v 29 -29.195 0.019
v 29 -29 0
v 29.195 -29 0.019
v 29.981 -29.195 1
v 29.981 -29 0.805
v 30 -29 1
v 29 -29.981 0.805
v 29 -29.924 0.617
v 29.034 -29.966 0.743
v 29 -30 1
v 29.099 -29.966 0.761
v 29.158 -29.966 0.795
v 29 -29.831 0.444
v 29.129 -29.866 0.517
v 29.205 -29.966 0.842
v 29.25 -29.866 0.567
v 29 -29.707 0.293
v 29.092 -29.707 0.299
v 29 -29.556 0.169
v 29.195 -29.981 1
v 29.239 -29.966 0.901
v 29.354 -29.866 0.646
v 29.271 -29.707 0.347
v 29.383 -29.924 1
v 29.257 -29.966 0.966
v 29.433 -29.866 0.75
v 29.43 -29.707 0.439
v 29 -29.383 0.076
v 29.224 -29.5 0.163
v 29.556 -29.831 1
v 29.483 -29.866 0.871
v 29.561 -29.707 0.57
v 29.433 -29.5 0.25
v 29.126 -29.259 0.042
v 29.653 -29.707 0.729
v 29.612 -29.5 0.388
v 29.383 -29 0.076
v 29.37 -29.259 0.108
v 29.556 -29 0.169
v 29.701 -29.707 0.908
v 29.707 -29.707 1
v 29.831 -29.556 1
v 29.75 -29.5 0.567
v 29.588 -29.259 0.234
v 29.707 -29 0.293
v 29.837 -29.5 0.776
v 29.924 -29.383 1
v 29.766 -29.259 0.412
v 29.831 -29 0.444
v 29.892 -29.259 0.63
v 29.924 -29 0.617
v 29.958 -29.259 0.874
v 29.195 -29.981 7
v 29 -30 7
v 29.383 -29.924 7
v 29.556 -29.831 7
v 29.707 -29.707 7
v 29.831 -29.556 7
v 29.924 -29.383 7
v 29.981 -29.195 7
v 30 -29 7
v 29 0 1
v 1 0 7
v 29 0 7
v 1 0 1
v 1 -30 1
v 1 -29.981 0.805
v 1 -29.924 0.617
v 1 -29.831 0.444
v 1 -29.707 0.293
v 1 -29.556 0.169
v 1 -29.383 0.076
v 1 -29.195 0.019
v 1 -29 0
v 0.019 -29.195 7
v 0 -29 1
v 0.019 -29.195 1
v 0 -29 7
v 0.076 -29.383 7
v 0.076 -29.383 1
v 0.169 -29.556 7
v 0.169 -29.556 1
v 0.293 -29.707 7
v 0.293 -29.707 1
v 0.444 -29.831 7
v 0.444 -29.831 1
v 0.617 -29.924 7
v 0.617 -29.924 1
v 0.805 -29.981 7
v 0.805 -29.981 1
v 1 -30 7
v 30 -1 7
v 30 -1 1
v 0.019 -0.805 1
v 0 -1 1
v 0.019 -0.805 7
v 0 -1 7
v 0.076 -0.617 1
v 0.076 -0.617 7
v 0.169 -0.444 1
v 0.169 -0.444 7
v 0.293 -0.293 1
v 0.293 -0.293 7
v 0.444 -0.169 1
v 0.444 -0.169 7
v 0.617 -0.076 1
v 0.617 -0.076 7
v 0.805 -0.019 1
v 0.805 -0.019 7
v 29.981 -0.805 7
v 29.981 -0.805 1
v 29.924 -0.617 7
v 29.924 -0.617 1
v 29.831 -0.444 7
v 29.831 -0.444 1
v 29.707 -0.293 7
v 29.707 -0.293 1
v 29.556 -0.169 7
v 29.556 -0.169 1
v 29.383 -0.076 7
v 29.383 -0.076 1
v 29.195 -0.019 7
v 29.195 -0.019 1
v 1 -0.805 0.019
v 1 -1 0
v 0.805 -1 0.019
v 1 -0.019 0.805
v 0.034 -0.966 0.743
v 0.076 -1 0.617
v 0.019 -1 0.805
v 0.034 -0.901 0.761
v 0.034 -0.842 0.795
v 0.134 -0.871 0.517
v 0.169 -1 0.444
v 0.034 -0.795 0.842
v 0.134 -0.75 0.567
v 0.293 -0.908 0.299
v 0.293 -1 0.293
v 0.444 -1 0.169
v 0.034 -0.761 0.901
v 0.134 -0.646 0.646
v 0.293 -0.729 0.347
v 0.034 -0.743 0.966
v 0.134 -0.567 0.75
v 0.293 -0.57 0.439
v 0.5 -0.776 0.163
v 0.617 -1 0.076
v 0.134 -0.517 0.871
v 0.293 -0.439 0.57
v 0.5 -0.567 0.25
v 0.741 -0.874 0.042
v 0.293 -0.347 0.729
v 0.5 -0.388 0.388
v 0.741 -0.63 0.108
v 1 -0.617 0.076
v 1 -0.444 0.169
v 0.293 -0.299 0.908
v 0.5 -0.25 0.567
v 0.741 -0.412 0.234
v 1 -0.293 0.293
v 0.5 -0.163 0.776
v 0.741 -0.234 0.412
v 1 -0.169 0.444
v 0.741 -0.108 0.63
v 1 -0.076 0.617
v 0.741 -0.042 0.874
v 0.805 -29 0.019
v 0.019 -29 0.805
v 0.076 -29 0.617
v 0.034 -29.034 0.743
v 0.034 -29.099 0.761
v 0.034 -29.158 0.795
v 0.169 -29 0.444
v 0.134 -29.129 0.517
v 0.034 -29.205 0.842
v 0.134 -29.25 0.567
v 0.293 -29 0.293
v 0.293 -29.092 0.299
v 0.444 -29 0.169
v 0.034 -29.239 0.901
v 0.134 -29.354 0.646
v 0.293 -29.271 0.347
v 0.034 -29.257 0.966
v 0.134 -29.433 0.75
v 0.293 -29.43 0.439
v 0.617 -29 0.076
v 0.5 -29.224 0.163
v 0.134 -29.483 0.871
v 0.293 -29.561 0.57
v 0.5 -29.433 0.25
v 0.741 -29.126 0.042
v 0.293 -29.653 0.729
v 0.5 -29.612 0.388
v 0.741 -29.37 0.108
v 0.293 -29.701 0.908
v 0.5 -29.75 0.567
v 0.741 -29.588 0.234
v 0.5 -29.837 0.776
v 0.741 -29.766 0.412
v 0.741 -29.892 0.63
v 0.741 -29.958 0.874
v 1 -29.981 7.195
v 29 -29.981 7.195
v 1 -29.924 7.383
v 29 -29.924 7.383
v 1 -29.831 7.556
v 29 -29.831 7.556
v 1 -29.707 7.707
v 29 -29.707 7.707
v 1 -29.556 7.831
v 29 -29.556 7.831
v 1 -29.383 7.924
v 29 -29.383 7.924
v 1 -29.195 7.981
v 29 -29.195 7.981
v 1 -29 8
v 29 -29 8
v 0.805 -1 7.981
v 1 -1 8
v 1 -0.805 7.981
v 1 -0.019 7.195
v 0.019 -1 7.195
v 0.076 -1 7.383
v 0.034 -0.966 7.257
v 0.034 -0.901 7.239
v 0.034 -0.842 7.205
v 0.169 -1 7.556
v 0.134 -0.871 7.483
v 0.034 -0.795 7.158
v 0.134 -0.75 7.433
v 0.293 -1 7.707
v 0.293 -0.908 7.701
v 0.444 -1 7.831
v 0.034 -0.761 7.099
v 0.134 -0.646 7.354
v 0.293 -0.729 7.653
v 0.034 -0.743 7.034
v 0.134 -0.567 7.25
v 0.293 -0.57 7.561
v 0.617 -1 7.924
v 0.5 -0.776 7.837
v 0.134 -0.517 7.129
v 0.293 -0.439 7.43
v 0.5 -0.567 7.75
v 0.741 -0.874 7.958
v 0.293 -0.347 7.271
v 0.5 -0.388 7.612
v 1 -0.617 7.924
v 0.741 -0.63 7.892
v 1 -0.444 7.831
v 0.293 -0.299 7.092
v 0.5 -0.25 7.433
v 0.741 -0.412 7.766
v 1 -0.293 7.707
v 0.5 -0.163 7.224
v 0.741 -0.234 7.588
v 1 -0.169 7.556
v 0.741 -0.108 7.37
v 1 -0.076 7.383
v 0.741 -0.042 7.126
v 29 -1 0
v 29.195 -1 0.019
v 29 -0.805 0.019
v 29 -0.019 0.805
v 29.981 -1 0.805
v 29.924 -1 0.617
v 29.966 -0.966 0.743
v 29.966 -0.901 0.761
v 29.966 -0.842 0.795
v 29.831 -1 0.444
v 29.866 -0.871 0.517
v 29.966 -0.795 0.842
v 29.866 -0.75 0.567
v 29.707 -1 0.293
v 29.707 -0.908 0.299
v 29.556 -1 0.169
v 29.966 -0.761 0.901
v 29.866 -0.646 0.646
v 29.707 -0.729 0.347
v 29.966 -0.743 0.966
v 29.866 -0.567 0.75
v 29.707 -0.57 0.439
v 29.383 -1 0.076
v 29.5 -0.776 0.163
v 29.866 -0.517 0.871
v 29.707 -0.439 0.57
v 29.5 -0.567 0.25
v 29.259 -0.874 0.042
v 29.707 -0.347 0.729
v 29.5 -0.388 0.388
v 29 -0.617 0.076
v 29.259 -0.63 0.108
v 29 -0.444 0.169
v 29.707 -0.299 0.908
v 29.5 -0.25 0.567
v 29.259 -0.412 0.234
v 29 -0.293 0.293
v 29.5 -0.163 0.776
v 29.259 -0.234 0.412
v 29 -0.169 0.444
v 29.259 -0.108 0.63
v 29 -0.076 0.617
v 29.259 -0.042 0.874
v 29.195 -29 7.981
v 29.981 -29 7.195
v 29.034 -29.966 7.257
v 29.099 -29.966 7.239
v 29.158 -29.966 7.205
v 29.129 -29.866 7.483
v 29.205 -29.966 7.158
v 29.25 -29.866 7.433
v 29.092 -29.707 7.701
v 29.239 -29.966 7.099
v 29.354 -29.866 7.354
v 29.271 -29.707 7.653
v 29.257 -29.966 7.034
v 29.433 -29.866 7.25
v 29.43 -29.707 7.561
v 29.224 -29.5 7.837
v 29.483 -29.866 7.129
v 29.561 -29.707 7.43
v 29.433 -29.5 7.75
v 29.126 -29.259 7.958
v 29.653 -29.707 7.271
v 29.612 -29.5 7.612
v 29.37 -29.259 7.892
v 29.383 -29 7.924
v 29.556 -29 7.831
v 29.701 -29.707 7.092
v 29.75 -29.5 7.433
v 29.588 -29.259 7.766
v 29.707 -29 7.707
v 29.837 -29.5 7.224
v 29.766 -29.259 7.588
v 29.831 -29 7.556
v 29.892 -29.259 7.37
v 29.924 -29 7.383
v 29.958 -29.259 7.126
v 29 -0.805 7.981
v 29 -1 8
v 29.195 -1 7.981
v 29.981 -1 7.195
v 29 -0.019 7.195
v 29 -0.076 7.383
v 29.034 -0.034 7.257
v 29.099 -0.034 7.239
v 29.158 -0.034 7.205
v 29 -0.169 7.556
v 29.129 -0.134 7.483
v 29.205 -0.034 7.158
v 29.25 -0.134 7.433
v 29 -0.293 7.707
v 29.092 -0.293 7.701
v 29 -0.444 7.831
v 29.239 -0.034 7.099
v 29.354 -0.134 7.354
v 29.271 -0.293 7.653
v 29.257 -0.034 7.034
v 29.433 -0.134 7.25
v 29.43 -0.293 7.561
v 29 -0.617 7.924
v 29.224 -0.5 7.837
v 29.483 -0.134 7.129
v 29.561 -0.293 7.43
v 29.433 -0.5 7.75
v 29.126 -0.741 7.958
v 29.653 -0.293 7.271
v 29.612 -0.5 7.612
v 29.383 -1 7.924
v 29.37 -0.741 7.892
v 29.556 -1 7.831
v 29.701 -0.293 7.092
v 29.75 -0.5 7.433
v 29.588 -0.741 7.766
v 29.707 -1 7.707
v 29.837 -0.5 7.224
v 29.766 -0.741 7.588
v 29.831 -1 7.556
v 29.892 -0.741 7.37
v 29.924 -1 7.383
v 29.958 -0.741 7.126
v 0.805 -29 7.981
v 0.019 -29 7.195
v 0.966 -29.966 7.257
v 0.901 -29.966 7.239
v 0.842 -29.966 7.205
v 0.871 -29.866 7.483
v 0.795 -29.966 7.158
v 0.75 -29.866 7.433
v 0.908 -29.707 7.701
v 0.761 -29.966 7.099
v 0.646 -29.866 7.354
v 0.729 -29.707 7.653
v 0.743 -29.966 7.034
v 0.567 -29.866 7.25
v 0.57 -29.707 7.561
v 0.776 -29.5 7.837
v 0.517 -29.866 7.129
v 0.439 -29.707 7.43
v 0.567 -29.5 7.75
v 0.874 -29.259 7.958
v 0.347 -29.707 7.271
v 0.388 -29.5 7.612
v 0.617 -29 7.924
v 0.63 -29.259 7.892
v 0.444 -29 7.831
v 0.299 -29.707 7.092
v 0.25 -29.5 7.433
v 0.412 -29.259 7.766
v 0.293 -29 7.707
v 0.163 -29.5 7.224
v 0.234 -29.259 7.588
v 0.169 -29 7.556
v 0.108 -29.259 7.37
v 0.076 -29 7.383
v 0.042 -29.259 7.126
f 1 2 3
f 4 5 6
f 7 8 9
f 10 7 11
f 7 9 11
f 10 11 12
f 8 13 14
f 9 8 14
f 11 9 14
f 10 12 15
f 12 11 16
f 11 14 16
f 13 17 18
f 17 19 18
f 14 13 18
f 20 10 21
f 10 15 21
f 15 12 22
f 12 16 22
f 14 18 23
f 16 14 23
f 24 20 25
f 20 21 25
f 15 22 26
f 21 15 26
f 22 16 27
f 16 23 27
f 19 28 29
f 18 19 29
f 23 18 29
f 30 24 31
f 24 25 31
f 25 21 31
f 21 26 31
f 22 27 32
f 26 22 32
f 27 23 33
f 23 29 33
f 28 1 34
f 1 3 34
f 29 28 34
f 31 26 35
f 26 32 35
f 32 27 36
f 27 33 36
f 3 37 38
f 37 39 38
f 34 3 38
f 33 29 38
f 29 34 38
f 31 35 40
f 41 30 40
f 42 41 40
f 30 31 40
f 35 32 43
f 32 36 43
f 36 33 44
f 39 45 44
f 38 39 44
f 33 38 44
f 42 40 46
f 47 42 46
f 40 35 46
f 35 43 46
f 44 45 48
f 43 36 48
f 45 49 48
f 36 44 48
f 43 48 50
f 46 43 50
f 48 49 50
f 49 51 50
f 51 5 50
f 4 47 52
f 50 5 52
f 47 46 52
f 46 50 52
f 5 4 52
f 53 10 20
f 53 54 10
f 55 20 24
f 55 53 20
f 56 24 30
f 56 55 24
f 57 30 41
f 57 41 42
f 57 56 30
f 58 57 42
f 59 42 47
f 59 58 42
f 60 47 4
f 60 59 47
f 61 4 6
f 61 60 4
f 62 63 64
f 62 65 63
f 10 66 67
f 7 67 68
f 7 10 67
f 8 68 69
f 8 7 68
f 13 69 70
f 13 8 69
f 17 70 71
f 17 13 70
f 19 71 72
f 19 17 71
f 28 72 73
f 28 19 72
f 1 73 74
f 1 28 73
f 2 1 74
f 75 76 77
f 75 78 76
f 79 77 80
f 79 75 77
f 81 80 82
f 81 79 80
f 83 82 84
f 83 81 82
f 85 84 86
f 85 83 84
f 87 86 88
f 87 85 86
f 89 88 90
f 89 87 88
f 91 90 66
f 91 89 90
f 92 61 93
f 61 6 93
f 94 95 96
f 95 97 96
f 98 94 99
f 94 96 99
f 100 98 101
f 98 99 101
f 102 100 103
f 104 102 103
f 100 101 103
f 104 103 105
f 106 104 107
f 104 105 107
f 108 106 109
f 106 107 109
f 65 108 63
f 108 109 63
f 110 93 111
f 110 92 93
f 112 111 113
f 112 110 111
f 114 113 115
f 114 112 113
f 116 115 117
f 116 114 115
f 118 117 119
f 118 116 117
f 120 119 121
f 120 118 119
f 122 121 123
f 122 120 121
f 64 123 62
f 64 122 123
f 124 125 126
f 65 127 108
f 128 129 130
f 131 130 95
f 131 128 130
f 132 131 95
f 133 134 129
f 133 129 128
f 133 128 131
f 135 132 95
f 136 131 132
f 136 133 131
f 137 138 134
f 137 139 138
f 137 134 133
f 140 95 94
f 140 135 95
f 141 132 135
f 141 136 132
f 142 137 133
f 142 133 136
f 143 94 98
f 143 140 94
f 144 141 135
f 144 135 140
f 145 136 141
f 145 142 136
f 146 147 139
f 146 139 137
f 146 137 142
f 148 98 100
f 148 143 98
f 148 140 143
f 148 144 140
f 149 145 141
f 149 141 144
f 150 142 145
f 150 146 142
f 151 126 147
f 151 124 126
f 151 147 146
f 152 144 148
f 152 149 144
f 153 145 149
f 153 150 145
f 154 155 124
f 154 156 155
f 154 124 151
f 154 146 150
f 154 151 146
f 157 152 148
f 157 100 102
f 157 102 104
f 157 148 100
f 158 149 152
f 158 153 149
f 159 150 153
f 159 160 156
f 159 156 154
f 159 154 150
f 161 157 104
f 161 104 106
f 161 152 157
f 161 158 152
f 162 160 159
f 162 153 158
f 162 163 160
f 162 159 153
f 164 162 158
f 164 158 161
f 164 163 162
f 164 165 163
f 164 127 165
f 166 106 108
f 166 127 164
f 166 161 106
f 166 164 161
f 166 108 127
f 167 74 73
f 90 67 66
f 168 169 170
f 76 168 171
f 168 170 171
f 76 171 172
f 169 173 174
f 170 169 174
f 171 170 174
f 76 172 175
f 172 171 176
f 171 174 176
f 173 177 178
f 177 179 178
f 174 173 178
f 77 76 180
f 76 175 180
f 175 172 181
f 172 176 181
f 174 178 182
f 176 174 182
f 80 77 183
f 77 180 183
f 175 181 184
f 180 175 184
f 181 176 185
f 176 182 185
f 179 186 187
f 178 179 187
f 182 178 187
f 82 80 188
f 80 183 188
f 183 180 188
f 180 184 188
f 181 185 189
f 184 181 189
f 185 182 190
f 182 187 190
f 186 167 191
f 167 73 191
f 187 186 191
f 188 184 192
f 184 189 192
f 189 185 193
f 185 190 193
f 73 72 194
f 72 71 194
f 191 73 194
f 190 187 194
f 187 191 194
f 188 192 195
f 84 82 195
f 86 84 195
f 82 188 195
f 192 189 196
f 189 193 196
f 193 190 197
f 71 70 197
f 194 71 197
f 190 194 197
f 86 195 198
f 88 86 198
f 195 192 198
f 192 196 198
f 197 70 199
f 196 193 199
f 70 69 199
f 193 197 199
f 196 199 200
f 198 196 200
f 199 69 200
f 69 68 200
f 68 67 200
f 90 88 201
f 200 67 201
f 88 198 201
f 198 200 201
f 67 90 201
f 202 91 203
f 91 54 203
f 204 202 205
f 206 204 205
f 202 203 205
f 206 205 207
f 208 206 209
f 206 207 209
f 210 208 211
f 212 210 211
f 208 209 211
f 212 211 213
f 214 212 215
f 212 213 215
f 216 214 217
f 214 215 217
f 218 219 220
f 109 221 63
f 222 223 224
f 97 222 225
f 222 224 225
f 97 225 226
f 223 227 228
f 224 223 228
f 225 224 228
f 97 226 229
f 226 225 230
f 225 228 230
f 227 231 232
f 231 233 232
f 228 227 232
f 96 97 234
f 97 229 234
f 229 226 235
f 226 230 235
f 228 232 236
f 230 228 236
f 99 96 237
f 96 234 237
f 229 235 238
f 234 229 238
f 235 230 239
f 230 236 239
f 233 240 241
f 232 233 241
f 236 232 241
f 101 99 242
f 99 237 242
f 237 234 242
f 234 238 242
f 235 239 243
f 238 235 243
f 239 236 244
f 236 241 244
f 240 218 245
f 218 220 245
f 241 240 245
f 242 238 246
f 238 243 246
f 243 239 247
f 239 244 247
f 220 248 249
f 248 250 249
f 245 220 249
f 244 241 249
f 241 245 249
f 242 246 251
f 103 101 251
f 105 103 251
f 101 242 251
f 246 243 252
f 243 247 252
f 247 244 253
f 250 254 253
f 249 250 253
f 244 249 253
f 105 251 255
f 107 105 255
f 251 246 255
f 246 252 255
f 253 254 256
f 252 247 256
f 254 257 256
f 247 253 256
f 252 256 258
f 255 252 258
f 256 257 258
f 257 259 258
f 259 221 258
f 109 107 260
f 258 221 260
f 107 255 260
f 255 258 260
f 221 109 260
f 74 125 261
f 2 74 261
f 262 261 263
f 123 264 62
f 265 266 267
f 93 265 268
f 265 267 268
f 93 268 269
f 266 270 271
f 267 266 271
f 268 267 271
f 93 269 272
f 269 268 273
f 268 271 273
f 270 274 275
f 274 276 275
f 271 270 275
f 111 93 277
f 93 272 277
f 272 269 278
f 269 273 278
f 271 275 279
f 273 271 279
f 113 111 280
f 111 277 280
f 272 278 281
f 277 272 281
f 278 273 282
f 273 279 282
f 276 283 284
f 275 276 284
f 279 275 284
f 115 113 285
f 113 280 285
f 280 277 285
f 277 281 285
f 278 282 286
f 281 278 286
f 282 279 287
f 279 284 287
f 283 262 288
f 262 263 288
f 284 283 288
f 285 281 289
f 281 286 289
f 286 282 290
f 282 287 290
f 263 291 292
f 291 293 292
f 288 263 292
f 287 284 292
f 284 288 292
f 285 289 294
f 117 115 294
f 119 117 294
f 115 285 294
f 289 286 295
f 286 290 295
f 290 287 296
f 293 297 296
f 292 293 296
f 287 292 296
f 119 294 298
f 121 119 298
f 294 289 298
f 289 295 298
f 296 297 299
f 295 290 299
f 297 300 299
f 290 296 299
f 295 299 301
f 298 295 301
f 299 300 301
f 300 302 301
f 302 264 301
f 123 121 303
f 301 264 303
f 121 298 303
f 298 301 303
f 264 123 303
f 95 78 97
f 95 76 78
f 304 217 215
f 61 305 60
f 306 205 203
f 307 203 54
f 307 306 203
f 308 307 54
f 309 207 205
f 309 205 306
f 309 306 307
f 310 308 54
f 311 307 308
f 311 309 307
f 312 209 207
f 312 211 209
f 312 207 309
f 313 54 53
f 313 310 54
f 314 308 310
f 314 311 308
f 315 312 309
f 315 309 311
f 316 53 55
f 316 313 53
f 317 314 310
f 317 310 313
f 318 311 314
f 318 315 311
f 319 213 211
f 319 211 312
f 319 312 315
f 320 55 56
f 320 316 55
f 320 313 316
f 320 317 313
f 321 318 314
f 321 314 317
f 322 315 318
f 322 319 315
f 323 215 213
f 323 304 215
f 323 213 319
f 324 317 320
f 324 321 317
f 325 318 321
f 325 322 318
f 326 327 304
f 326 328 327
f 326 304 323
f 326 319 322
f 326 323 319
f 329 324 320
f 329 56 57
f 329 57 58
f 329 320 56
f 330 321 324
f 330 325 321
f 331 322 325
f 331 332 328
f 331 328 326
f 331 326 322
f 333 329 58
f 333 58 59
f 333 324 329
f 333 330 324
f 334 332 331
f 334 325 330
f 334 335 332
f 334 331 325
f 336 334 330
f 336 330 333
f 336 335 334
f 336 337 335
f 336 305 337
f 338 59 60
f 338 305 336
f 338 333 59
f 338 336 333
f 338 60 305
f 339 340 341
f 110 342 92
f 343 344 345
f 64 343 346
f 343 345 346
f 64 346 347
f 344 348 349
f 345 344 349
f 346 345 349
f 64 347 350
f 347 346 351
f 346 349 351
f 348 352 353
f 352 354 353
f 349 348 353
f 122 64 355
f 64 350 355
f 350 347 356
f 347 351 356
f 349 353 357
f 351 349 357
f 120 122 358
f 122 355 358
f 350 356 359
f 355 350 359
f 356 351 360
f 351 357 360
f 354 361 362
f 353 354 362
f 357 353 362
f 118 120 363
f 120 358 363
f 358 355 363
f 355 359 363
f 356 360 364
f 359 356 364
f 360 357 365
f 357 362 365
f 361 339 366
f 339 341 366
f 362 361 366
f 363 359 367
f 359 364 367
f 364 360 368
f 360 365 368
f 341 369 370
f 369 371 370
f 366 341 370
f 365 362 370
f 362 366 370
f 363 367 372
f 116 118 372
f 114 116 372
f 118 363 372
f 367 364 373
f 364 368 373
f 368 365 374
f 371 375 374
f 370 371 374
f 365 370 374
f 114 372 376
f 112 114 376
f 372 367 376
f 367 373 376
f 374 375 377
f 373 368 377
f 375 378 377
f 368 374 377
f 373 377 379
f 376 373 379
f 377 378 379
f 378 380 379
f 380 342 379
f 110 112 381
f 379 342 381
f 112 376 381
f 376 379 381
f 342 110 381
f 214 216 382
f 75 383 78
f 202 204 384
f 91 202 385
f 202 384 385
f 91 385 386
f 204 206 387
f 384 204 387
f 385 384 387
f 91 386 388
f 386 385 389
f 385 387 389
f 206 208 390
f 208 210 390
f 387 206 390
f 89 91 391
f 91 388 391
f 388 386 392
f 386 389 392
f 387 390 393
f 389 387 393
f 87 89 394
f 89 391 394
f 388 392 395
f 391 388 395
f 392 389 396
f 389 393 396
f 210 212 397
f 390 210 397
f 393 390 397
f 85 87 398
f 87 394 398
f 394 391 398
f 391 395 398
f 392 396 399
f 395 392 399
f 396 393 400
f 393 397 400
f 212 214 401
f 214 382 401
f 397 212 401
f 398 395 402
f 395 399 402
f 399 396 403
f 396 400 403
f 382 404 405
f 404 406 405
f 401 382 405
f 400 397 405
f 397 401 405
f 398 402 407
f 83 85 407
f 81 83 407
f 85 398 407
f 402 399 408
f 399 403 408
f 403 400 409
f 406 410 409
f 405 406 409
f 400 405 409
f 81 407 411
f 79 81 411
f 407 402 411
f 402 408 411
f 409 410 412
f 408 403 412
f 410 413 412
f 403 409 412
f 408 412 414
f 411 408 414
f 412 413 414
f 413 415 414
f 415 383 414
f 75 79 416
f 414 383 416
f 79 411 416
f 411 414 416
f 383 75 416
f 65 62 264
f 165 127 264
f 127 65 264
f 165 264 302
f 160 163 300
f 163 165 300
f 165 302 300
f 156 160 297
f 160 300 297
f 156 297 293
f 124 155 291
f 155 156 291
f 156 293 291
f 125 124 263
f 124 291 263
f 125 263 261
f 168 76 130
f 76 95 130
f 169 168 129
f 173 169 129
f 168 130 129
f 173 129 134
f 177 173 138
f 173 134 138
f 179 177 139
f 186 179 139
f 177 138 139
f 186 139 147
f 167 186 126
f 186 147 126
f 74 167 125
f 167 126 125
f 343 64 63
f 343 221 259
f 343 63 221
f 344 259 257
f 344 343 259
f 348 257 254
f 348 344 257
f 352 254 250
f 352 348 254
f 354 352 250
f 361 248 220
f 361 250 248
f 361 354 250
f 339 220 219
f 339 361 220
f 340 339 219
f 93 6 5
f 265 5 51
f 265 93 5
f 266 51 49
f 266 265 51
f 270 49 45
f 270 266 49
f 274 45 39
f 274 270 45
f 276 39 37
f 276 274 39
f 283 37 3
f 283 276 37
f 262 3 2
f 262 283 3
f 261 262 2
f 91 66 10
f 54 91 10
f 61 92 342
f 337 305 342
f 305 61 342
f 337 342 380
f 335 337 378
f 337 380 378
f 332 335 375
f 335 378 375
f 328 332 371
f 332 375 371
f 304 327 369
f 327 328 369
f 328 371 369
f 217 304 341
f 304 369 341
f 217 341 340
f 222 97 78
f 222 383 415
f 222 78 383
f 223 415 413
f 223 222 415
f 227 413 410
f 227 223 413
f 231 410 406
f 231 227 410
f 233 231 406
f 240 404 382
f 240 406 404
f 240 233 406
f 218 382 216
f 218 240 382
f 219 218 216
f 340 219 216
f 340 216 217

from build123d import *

# Parameters (mm, degrees)
SKETCH2_W      = 30
SKETCH2_H      = 30
EXTRUDE1_DEPTH = 8
FILLET1_R      = 1


with BuildPart() as part:
    # Sketch2 → Extrude1 (new body)
    with BuildSketch(Plane.XY):
        with Locations((15, -15)):
            Rectangle(SKETCH2_W, SKETCH2_H)
    extrude(amount=EXTRUDE1_DEPTH)

    # Fillet1
    fillet1_edges = [part.edges().sort_by_distance(p)[0] for p in [
        (30, -15, 8),
        (15, 0, 8),
        (0, -15, 8),
        (15, 0, 0),
        (30, -15, 0),
        (15, -30, 0),
        (0, -15, 0),
        (15, -30, 8),
        (0, 0, 4),
        (30, 0, 4),
        (30, -30, 4),
        (0, -30, 4),
    ]]
    fillet(fillet1_edges, radius=FILLET1_R)


solid = part.part
